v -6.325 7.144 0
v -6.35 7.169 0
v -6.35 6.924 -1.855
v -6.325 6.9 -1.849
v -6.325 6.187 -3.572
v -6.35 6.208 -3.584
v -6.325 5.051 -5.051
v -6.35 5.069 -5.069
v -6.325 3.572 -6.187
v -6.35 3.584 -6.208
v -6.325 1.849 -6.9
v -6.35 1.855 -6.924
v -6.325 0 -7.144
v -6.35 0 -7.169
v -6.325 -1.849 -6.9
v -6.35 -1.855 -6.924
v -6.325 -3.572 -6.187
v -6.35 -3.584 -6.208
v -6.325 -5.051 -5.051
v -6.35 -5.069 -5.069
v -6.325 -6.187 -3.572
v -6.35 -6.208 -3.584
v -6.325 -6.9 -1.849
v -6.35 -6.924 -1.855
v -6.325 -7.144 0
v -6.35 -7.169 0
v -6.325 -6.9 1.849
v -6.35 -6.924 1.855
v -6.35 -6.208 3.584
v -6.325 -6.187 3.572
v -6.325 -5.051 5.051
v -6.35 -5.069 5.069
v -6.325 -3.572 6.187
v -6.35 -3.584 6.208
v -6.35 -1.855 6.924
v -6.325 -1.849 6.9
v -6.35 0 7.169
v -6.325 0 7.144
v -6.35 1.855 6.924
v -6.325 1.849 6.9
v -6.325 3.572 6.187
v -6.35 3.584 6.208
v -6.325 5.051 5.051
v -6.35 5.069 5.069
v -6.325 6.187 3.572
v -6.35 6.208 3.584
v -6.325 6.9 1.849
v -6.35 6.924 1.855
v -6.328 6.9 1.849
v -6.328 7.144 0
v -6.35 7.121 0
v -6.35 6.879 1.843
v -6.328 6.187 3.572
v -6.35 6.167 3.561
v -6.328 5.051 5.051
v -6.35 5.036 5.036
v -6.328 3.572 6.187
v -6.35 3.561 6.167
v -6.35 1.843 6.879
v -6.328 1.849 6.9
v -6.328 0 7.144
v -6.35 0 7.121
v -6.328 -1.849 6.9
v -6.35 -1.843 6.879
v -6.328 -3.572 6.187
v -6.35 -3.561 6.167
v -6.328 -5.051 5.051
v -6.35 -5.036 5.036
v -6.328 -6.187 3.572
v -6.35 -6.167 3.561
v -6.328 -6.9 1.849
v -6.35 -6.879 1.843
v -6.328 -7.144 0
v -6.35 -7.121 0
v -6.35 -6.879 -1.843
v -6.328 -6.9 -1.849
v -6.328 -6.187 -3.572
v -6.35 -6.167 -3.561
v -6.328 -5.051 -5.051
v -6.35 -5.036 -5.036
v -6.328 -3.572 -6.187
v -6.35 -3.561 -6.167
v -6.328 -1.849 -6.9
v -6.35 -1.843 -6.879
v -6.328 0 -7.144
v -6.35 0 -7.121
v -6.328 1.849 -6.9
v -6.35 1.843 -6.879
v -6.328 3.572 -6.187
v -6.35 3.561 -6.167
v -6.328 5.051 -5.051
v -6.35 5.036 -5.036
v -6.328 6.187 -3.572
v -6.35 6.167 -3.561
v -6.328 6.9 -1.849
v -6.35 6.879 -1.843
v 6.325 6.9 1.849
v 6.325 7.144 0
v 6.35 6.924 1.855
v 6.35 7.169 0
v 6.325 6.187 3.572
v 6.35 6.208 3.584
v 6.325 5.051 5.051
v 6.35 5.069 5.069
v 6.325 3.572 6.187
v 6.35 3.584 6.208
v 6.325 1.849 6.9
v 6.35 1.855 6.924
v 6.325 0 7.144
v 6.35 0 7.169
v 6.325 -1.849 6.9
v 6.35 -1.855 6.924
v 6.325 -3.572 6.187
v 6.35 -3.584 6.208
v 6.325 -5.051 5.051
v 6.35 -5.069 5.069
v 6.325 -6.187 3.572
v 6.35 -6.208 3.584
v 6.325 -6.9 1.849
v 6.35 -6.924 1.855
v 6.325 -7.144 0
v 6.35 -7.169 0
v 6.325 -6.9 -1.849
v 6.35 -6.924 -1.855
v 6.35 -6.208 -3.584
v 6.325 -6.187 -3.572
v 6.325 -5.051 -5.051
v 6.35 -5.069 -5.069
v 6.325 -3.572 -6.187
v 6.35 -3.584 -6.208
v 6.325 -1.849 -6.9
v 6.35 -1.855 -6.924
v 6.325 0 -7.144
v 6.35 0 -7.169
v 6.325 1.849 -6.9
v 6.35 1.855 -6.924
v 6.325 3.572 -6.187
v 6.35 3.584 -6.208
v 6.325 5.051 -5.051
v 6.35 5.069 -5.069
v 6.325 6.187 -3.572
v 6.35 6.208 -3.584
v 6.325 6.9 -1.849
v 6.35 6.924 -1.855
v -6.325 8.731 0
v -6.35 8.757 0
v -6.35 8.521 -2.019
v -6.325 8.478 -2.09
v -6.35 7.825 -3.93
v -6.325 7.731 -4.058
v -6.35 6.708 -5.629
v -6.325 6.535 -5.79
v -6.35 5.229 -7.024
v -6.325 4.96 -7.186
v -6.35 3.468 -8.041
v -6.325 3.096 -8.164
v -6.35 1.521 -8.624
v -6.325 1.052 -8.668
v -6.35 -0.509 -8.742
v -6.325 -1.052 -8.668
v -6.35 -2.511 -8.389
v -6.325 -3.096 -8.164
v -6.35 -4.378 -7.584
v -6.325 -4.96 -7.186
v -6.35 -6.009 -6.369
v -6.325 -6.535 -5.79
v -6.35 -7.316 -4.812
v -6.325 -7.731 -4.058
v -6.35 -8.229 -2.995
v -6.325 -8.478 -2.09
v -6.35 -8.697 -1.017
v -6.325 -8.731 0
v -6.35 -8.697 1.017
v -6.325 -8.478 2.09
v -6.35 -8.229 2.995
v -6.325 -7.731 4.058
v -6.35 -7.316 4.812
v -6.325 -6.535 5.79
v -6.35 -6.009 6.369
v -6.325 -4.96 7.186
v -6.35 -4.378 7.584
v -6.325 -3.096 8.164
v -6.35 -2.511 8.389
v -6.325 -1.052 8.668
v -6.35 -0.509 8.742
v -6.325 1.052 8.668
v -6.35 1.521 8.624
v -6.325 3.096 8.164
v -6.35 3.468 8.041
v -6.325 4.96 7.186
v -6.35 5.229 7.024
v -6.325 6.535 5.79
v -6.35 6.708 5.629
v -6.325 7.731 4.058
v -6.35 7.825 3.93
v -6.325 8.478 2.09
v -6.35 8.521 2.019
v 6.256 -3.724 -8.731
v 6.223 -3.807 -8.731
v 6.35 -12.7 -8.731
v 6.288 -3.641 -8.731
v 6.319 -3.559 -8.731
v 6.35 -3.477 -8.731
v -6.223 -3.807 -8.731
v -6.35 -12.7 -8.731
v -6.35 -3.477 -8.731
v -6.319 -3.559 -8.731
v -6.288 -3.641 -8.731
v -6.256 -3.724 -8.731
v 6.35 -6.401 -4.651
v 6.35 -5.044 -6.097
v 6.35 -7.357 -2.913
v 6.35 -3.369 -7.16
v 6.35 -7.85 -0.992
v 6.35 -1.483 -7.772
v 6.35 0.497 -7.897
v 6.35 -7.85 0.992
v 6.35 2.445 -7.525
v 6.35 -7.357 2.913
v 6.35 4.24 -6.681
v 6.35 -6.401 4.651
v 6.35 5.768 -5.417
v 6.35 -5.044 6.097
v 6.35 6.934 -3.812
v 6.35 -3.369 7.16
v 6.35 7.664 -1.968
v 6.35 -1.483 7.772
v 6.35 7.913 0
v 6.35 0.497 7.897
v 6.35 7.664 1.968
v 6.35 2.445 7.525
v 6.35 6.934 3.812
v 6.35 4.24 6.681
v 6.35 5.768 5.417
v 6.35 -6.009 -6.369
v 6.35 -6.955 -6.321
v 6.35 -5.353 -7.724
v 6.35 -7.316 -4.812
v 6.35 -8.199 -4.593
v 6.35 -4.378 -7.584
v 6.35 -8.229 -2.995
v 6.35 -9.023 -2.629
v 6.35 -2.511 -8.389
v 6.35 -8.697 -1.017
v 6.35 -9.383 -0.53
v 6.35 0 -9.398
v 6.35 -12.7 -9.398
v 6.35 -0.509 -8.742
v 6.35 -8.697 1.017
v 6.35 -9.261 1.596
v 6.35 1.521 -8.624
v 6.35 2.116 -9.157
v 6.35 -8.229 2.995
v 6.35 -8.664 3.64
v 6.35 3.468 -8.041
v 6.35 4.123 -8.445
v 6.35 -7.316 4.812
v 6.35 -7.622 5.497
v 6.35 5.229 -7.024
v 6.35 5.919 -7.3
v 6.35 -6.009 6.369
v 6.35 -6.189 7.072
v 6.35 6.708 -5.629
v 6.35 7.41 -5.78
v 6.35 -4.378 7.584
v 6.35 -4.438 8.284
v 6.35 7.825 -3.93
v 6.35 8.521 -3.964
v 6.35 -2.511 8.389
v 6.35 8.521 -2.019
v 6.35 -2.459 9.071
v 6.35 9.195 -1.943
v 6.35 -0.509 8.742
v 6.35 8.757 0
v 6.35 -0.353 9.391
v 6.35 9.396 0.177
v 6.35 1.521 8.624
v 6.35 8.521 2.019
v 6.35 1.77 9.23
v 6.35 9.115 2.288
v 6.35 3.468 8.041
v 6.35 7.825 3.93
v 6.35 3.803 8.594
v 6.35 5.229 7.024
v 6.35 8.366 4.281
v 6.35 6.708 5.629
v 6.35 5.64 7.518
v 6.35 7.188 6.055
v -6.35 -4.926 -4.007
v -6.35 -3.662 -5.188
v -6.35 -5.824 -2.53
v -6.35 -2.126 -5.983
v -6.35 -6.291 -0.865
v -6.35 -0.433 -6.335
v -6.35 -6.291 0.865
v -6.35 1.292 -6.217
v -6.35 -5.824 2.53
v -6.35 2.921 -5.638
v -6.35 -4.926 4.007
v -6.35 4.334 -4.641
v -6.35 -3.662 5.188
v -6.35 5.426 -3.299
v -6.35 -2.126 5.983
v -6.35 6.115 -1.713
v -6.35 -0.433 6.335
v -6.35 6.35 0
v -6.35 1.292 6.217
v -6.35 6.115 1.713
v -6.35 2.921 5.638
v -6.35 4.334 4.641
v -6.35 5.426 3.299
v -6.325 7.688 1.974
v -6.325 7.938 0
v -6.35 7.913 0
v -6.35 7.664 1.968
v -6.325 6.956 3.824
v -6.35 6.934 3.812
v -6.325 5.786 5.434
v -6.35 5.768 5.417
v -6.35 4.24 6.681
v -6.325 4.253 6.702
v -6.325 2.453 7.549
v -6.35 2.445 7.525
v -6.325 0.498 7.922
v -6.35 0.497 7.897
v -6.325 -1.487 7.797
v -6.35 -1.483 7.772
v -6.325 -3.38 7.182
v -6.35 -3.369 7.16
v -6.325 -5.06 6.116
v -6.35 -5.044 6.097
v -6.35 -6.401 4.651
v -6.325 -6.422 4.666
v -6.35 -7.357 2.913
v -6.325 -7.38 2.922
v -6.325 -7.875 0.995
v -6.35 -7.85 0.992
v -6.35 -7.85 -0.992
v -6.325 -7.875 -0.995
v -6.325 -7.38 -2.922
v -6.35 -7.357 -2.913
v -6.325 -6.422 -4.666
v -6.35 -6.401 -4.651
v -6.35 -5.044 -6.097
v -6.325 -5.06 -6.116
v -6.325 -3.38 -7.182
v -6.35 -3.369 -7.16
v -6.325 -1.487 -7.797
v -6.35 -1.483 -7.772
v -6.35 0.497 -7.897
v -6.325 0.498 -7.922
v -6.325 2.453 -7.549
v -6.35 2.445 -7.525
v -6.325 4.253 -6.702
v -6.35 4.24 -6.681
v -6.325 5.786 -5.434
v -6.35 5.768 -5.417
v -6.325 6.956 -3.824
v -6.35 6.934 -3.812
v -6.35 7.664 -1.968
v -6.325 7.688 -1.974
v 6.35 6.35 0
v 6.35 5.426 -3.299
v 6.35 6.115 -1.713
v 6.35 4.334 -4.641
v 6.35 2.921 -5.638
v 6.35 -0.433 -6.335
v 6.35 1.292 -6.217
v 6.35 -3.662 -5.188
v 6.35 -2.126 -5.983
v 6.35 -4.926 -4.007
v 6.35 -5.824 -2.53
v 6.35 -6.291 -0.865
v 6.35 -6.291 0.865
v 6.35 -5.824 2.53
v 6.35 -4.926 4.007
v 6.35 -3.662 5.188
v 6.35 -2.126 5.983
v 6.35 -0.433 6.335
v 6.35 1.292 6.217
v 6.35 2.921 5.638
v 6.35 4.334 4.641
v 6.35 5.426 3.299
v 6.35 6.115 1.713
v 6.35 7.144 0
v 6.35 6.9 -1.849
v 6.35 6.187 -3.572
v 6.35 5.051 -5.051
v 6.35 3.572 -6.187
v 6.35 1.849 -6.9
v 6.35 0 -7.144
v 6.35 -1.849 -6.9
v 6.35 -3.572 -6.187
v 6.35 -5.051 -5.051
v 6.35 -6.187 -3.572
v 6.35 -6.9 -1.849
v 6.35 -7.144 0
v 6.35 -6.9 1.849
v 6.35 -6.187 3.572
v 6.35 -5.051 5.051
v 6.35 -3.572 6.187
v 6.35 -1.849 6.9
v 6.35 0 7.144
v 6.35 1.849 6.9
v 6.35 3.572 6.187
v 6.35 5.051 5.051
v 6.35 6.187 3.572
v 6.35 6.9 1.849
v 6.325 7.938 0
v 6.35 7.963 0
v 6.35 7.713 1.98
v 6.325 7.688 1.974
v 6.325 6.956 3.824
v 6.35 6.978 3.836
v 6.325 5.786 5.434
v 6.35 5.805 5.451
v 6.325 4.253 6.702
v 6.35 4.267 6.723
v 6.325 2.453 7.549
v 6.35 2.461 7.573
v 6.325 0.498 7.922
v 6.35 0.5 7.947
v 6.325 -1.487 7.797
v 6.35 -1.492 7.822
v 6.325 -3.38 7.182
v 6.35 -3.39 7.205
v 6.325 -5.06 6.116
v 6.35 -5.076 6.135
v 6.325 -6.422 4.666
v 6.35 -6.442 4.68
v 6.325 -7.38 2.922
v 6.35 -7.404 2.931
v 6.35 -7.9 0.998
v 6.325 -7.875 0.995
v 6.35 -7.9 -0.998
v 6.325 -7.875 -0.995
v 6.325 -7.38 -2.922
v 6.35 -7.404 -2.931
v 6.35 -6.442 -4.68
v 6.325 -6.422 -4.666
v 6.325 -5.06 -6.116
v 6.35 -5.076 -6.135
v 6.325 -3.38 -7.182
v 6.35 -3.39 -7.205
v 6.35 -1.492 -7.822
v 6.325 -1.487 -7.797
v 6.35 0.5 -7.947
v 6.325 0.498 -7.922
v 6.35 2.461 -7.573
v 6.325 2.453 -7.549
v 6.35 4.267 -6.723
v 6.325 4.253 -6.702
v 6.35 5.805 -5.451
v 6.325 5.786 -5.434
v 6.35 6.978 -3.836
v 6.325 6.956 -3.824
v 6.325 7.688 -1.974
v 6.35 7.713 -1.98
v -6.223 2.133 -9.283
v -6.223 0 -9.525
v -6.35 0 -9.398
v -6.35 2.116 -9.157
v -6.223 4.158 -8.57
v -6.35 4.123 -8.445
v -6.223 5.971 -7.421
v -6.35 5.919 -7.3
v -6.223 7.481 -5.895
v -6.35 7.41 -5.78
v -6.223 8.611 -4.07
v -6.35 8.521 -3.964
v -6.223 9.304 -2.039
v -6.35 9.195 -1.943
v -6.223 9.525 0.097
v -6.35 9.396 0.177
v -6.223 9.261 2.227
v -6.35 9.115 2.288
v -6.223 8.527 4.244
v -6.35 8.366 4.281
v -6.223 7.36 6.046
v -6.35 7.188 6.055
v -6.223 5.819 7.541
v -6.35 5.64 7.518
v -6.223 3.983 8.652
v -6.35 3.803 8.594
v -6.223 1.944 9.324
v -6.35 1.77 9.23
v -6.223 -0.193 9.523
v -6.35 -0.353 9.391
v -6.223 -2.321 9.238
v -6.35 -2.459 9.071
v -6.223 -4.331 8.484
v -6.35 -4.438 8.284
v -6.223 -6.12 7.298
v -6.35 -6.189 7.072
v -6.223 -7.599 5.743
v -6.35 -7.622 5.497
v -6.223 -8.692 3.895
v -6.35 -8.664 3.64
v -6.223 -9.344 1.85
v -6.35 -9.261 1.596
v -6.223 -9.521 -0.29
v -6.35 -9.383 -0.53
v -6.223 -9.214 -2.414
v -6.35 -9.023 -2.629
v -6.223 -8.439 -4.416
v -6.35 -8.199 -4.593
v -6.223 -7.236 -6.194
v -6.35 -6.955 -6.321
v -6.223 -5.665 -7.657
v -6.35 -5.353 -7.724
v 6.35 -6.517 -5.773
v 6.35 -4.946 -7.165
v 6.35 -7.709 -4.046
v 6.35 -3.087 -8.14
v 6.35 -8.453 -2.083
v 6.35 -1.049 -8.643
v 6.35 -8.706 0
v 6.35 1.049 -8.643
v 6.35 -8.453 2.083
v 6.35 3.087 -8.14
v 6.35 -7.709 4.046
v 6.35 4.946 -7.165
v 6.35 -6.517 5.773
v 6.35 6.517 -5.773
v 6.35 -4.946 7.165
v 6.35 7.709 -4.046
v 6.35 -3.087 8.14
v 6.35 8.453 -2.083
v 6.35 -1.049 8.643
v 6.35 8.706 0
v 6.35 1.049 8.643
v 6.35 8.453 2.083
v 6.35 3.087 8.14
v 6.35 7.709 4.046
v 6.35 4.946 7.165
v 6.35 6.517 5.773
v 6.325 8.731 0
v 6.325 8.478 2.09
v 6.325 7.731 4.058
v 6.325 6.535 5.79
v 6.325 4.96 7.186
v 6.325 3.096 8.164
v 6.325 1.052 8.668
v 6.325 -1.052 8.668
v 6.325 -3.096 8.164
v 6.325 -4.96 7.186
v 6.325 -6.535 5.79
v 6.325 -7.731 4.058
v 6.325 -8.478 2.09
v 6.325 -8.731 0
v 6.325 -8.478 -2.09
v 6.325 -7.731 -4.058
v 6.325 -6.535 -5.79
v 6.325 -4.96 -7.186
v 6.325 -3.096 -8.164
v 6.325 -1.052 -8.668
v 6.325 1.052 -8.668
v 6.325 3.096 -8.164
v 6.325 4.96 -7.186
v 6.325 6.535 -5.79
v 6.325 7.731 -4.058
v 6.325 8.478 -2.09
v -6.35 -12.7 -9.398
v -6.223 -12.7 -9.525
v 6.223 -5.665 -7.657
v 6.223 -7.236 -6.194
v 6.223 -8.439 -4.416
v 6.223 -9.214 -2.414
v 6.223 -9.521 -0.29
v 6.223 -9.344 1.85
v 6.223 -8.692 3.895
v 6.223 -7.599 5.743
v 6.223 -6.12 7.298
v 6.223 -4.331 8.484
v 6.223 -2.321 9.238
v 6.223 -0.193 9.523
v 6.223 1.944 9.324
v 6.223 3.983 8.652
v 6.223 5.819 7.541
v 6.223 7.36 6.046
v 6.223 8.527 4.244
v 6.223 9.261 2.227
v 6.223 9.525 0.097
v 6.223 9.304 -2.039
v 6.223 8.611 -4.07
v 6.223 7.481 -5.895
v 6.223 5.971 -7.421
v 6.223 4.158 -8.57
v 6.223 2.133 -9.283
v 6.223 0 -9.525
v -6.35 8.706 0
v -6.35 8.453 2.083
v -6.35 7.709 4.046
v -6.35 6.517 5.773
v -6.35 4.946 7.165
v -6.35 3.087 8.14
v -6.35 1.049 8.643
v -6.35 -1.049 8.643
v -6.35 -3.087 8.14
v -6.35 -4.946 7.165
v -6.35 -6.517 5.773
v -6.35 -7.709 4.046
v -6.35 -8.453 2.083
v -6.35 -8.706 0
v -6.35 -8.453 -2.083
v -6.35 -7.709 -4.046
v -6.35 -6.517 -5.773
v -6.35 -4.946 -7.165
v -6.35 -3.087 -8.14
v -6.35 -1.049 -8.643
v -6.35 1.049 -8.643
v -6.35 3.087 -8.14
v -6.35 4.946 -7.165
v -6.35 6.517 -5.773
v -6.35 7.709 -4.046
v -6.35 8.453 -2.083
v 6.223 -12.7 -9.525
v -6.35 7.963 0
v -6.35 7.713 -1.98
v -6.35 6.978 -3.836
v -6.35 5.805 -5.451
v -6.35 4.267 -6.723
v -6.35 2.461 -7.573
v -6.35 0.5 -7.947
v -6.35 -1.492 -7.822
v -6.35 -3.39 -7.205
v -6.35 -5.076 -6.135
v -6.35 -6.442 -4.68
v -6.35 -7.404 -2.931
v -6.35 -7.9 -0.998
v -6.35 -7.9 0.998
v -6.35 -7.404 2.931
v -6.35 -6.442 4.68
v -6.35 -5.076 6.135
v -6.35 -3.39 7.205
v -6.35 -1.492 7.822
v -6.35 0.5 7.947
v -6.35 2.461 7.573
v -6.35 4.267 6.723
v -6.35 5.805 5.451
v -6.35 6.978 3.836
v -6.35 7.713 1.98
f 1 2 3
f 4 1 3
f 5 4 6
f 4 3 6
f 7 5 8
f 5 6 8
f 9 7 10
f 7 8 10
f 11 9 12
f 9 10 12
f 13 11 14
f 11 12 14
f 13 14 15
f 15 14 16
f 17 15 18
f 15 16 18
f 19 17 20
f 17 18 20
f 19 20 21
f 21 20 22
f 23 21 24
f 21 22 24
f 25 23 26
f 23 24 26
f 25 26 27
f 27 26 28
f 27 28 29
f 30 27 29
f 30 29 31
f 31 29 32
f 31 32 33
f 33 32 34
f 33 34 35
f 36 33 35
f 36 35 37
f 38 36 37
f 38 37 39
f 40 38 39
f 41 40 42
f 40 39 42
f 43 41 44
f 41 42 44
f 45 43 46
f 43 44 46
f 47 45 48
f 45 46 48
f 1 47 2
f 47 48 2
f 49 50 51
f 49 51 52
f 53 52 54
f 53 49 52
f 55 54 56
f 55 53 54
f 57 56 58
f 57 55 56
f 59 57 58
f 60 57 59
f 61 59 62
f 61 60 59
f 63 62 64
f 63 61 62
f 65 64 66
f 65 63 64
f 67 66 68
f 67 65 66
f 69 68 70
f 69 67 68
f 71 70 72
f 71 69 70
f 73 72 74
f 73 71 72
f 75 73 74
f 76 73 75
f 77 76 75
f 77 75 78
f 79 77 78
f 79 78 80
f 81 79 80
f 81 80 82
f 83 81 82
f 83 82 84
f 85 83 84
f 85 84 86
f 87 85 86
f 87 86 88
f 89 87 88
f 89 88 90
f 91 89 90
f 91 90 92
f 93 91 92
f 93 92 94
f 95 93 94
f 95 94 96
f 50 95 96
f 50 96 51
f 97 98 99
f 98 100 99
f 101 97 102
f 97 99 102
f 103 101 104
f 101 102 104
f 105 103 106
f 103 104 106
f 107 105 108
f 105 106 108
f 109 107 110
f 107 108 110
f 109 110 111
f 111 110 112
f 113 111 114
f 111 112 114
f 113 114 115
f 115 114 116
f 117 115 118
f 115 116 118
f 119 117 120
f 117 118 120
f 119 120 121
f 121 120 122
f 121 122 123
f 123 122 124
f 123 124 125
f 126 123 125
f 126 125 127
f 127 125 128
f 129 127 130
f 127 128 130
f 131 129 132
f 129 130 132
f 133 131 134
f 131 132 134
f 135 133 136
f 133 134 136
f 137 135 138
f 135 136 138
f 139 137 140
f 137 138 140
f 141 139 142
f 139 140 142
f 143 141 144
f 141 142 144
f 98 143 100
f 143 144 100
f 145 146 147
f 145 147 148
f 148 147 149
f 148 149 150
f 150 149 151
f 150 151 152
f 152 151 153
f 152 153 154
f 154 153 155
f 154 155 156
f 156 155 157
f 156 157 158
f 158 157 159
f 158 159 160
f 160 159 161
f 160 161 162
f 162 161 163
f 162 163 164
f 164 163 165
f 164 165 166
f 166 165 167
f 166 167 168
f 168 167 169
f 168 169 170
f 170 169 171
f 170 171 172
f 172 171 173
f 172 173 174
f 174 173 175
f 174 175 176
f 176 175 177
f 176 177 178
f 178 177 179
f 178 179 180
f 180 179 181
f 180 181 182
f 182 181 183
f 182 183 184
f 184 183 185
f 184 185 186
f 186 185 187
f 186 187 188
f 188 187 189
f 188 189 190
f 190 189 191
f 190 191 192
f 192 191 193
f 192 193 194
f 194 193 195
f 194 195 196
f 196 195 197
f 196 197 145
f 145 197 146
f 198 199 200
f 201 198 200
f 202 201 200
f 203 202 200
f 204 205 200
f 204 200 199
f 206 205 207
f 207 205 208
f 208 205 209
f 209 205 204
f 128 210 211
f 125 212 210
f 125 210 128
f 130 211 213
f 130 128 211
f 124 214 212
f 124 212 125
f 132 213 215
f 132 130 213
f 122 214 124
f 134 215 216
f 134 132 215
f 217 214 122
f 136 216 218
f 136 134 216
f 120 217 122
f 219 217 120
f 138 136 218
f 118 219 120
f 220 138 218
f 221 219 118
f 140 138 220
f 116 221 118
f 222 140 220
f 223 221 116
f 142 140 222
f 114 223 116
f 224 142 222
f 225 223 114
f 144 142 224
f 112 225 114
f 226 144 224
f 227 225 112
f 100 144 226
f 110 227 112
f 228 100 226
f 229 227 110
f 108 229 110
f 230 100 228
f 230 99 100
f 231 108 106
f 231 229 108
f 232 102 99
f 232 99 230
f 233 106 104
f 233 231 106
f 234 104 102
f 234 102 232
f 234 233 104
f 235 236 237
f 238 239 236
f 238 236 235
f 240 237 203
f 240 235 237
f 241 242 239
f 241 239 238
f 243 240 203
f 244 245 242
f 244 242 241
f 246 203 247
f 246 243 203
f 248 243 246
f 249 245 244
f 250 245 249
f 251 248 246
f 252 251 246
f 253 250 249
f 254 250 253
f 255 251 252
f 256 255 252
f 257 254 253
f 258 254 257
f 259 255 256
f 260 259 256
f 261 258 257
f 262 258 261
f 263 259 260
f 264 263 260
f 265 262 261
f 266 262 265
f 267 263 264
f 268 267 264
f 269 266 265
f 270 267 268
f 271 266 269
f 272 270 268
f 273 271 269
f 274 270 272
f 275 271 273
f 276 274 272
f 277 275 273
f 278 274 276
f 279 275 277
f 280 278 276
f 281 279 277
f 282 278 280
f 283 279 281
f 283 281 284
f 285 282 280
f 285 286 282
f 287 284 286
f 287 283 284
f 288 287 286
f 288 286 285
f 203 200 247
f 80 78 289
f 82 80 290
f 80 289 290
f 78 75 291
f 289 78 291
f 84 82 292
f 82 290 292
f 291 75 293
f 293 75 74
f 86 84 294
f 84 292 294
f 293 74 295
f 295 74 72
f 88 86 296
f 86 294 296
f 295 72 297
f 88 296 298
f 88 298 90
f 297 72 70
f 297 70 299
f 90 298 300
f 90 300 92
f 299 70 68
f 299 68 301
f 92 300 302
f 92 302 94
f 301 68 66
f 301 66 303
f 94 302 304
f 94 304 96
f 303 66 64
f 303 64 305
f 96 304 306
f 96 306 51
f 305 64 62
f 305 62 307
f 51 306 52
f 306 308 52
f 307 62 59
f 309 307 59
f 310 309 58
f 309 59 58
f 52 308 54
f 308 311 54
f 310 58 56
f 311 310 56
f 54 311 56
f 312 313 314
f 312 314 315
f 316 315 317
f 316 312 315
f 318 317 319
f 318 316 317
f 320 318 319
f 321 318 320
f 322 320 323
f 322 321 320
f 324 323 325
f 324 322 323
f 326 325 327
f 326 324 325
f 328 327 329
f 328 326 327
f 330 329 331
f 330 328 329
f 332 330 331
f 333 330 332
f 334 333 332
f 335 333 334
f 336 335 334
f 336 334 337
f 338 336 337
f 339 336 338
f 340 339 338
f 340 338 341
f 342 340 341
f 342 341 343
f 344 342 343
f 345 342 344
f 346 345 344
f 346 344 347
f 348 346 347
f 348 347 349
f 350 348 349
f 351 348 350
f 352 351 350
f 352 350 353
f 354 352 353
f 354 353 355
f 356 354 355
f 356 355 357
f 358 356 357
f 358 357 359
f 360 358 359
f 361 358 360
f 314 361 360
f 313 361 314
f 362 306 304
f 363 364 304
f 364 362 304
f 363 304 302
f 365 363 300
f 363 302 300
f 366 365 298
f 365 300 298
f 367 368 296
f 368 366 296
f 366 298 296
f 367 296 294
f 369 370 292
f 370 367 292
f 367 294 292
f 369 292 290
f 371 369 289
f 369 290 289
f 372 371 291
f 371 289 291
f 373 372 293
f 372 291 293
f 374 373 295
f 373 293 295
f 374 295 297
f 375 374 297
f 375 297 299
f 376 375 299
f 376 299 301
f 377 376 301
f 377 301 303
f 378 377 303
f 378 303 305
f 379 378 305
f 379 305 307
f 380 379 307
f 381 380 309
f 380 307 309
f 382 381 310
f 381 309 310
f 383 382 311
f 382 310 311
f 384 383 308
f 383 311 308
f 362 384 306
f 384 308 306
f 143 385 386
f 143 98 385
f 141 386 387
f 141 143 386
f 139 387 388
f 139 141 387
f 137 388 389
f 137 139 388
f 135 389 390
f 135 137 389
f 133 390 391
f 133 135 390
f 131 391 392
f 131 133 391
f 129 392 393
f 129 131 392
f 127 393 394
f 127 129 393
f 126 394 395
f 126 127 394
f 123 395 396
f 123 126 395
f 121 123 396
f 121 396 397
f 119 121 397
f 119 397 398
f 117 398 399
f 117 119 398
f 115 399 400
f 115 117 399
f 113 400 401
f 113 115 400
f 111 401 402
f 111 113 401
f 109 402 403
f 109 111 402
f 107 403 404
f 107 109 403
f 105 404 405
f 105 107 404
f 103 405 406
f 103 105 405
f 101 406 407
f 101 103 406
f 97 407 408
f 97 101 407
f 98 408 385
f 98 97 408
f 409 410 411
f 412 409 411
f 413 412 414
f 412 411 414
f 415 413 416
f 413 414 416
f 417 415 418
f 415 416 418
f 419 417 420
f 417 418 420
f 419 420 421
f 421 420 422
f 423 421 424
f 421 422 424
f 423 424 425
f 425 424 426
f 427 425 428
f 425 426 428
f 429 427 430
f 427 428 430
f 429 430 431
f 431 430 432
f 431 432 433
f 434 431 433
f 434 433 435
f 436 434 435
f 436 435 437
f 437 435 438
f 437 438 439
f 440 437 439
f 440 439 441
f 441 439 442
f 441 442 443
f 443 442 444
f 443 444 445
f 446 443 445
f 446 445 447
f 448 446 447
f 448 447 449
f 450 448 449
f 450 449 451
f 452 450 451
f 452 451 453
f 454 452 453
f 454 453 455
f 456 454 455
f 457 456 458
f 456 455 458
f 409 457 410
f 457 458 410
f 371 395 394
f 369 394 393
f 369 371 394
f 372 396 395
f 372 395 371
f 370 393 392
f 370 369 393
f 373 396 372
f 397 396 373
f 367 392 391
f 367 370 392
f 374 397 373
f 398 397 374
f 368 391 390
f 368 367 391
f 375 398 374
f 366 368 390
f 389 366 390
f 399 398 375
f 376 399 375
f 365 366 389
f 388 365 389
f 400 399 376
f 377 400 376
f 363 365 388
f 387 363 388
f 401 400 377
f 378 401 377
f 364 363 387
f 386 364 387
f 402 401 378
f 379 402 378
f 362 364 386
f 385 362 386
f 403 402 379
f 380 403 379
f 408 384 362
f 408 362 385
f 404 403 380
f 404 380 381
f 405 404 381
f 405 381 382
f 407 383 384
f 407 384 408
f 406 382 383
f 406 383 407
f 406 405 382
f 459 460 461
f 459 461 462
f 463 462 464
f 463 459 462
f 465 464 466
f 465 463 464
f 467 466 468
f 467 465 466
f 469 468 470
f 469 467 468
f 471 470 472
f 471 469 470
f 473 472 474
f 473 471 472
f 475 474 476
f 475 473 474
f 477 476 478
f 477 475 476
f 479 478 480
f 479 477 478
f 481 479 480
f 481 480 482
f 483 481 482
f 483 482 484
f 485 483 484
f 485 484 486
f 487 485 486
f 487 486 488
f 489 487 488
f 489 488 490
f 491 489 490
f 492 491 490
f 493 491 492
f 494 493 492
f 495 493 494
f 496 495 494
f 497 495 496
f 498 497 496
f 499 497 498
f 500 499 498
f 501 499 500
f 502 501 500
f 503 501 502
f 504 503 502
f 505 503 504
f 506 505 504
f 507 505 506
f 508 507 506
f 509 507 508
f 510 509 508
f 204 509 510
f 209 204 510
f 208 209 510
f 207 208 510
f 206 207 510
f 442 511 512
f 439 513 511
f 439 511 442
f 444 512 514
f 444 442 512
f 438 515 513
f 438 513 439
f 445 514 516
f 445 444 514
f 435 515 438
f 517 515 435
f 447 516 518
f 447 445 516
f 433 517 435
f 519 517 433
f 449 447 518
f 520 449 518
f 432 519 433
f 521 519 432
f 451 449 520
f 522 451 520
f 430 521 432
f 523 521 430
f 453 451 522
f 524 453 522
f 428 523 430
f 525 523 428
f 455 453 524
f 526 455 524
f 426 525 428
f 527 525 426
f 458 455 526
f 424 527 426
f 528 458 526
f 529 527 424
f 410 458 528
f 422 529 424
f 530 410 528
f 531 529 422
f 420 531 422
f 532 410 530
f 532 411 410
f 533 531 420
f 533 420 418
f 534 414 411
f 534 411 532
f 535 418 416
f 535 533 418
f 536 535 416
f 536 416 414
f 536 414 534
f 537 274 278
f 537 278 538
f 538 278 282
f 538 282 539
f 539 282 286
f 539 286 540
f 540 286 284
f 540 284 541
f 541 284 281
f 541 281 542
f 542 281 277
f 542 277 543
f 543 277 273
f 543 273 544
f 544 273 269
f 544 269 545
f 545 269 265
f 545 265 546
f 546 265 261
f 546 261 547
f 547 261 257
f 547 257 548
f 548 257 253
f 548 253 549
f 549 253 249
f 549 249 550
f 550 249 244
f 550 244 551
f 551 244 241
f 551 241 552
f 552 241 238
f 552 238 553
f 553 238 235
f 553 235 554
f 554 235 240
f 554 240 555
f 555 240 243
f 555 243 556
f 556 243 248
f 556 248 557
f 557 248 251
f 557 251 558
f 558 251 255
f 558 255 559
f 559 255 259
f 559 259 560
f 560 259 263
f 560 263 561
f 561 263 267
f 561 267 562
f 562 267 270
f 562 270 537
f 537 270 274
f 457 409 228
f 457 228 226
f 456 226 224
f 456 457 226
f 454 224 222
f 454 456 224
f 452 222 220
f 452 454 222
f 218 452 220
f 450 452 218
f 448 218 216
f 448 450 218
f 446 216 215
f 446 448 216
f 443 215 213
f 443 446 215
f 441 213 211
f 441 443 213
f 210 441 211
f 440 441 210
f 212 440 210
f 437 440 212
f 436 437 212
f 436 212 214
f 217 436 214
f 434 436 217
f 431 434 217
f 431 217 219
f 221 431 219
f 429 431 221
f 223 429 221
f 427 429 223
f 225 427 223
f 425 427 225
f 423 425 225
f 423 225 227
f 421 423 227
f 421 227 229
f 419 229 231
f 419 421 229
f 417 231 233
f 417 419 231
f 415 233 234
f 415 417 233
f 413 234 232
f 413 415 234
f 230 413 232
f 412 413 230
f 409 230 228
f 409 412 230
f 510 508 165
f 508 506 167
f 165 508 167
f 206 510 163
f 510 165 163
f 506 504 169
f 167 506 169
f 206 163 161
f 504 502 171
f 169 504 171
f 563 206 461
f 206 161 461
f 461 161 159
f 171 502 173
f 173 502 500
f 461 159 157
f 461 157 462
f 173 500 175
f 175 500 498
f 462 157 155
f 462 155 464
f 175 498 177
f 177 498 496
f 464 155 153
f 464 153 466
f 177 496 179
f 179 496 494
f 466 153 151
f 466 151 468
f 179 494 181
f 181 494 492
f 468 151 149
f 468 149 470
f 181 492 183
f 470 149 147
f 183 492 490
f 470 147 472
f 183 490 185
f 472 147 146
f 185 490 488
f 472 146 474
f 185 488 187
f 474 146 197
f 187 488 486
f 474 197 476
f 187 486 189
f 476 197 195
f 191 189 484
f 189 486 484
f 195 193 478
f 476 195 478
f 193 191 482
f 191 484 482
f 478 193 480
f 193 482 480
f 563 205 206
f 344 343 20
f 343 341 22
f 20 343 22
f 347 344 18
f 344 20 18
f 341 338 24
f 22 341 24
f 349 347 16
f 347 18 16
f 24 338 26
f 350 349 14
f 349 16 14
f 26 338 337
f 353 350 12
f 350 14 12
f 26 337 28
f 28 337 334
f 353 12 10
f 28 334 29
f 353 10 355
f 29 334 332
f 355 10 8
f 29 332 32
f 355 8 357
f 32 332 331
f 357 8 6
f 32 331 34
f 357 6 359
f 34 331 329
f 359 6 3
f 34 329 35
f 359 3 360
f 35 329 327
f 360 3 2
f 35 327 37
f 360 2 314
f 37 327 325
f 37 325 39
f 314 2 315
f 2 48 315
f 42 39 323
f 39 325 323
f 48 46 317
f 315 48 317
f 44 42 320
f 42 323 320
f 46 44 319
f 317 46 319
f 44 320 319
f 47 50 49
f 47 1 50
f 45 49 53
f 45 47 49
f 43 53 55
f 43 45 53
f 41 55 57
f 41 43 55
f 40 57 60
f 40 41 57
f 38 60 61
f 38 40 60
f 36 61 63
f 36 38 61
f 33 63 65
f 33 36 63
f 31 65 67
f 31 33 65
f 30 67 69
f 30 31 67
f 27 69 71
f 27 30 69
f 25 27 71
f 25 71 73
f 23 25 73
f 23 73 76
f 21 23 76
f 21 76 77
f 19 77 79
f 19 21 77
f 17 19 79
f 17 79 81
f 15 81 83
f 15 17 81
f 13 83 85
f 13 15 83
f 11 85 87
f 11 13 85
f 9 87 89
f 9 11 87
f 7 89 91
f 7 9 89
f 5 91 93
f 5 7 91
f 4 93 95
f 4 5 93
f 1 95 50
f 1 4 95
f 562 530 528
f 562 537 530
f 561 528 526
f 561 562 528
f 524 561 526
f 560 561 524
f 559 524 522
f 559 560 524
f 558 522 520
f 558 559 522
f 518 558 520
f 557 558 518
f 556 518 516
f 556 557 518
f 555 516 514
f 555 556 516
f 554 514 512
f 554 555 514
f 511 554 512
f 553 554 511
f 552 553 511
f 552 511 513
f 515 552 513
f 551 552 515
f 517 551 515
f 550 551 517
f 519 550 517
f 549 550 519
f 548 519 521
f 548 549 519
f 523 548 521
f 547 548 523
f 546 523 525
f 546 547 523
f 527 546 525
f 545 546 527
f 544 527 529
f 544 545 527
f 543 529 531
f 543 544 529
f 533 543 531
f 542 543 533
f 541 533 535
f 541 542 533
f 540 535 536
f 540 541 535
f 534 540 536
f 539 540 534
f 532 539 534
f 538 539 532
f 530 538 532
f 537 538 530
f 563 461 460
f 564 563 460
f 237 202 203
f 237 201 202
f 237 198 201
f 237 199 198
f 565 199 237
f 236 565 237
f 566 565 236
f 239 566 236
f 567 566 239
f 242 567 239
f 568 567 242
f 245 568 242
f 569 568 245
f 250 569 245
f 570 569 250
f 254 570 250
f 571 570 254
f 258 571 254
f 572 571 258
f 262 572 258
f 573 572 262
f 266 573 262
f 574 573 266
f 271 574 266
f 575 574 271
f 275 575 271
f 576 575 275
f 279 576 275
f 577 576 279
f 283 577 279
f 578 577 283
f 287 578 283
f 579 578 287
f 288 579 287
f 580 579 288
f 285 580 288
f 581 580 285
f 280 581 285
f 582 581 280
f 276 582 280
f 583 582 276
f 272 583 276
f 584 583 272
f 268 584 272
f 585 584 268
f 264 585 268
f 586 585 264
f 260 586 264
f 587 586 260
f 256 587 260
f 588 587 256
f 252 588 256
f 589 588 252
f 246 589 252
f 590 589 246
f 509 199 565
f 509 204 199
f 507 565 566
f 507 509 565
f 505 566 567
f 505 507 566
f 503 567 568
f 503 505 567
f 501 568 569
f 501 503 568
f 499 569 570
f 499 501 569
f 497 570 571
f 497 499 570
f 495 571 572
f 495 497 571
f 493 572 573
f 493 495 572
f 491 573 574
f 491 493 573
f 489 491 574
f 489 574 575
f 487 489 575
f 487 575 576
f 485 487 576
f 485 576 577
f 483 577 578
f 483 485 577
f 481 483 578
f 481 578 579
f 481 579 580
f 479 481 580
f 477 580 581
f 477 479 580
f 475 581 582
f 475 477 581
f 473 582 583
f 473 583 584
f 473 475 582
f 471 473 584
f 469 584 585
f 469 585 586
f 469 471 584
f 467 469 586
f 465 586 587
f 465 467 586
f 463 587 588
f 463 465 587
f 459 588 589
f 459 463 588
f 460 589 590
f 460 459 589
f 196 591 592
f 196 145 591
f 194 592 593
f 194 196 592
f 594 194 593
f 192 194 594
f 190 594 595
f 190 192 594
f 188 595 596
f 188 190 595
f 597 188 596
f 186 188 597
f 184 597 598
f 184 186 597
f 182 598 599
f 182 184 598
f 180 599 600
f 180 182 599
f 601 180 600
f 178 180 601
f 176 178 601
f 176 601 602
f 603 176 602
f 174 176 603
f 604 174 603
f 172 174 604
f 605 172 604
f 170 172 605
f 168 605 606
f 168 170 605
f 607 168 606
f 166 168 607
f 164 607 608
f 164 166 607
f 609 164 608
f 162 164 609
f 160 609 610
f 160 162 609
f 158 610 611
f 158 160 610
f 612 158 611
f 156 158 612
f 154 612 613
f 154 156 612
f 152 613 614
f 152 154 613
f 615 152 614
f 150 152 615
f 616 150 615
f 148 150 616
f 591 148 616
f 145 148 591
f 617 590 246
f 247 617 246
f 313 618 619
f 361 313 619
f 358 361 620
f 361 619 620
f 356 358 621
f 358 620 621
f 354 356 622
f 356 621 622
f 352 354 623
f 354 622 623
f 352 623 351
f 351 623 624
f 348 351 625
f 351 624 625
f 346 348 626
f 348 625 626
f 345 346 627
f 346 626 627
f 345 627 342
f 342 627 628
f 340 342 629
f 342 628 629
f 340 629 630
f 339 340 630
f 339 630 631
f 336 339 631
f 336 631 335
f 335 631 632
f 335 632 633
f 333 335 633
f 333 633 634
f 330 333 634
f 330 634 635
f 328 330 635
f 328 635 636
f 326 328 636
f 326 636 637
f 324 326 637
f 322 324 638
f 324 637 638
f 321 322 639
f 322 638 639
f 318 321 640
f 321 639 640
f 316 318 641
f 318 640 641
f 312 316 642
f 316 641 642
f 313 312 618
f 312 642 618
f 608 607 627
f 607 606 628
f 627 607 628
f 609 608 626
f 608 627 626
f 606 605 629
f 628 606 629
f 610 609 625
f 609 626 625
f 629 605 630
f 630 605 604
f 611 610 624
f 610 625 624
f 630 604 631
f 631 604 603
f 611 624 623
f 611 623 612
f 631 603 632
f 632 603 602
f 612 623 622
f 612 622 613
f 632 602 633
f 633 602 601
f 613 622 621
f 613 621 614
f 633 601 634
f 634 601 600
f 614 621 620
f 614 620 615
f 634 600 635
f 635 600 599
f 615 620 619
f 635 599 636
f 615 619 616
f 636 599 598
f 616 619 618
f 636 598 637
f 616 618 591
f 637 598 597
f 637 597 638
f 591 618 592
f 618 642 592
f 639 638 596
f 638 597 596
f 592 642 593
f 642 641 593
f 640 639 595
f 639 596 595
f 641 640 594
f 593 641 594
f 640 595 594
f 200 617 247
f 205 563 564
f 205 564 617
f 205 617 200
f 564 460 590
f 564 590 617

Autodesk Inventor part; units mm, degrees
ref_plane "YZ Plane" through (0, 0, 0) normal (1, 0, 0) x (0, 1, 0)
ref_plane "XZ Plane" through (0, 0, 0) normal (0, 1, 0) x (-1, 0, 0)
ref_plane "XY Plane" through (0, 0, 0) normal (0, 0, 1) x (1, 0, 0)
sketch "Sketch1" plane through (0, 0, 0) normal (1, 0, 0) x (0, 1, 0)
  circle A0 centre (0, 0) radius 9.525
  circle A1 centre (0, 0) radius 8.7313
  line L0 (0, -9.525) -> (-12.7, -9.525)
  line L1 (-12.7, -9.525) -> (-12.7, -8.7313)
  line L2 (-12.7, -8.7313) -> (0, -8.7313)
  circle A2 centre (0, 0) radius 7.9375
  circle A3 centre (0, 0) radius 7.1438
  circle A4 centre (0, 0) radius 6.35
  point P0 (-3.8067, -8.7313)
  dimension "d13" = 19.05
  dimension "d0" = 0.7937
  dimension "d2" = 12.7
  dimension "d15" = 0.7937
  dimension "d16" = 0.7937
  dimension "d17" = 0.7937
extrude "Extrusion1" add sketch "Sketch1" along normal mid plane 12.7 contours A0 | L0 L1 L2 A0
chamfer "Chamfer2" distance 0.0254 angle 45 2 edges at (6.35, -8.7313, 0) (-6.35, -8.7313, 0)
extrude "Extrusion2" add sketch "Sketch1" along normal mid plane 12.7 contours A1
chamfer "Chamfer3" distance 0.0254 angle 45 4 edges at (-6.35, -8.7313, 0) (-6.35, -7.9375, 0) (6.35, -7.9375, 0) (6.35, -8.7313, 0)
extrude "Extrusion3" add sketch "Sketch1" along normal mid plane 12.7 contours A2
chamfer "Chamfer4" distance 0.0254 angle 45 4 edges at (-6.35, -7.9375, 0) (-6.35, -7.1438, 0) (6.35, -7.1438, 0) (6.35, -7.9375, 0)
extrude "Extrusion4" add sketch "Sketch1" along normal mid plane 12.7 contours A3
chamfer "Chamfer5" distance 0.0254 angle 45 1 edges at (-6.35, -7.1438, 0)
chamfer "Chamfer6" distance 0.127 angle 45 4 edges at (6.35, 1.9443, 9.3245) (6.35, -6.35, -9.525) (-6.35, 1.9443, 9.3245) (-6.35, -6.35, -9.525)
equation "\"d16\" = d15"
equation "\"d18\" = d3"
equation "\"d22\" = d8"
equation "\"d20\" = d3"
equation "\"d25\" = d8"
equation "\"d28\" = d3"
equation "\"d30\" = d8"
equation "\"d3\" = 12.7"
equation "\"d8\" = 0.0254"
properties part number "GreyT Constant Force Spring" material "Steel"
